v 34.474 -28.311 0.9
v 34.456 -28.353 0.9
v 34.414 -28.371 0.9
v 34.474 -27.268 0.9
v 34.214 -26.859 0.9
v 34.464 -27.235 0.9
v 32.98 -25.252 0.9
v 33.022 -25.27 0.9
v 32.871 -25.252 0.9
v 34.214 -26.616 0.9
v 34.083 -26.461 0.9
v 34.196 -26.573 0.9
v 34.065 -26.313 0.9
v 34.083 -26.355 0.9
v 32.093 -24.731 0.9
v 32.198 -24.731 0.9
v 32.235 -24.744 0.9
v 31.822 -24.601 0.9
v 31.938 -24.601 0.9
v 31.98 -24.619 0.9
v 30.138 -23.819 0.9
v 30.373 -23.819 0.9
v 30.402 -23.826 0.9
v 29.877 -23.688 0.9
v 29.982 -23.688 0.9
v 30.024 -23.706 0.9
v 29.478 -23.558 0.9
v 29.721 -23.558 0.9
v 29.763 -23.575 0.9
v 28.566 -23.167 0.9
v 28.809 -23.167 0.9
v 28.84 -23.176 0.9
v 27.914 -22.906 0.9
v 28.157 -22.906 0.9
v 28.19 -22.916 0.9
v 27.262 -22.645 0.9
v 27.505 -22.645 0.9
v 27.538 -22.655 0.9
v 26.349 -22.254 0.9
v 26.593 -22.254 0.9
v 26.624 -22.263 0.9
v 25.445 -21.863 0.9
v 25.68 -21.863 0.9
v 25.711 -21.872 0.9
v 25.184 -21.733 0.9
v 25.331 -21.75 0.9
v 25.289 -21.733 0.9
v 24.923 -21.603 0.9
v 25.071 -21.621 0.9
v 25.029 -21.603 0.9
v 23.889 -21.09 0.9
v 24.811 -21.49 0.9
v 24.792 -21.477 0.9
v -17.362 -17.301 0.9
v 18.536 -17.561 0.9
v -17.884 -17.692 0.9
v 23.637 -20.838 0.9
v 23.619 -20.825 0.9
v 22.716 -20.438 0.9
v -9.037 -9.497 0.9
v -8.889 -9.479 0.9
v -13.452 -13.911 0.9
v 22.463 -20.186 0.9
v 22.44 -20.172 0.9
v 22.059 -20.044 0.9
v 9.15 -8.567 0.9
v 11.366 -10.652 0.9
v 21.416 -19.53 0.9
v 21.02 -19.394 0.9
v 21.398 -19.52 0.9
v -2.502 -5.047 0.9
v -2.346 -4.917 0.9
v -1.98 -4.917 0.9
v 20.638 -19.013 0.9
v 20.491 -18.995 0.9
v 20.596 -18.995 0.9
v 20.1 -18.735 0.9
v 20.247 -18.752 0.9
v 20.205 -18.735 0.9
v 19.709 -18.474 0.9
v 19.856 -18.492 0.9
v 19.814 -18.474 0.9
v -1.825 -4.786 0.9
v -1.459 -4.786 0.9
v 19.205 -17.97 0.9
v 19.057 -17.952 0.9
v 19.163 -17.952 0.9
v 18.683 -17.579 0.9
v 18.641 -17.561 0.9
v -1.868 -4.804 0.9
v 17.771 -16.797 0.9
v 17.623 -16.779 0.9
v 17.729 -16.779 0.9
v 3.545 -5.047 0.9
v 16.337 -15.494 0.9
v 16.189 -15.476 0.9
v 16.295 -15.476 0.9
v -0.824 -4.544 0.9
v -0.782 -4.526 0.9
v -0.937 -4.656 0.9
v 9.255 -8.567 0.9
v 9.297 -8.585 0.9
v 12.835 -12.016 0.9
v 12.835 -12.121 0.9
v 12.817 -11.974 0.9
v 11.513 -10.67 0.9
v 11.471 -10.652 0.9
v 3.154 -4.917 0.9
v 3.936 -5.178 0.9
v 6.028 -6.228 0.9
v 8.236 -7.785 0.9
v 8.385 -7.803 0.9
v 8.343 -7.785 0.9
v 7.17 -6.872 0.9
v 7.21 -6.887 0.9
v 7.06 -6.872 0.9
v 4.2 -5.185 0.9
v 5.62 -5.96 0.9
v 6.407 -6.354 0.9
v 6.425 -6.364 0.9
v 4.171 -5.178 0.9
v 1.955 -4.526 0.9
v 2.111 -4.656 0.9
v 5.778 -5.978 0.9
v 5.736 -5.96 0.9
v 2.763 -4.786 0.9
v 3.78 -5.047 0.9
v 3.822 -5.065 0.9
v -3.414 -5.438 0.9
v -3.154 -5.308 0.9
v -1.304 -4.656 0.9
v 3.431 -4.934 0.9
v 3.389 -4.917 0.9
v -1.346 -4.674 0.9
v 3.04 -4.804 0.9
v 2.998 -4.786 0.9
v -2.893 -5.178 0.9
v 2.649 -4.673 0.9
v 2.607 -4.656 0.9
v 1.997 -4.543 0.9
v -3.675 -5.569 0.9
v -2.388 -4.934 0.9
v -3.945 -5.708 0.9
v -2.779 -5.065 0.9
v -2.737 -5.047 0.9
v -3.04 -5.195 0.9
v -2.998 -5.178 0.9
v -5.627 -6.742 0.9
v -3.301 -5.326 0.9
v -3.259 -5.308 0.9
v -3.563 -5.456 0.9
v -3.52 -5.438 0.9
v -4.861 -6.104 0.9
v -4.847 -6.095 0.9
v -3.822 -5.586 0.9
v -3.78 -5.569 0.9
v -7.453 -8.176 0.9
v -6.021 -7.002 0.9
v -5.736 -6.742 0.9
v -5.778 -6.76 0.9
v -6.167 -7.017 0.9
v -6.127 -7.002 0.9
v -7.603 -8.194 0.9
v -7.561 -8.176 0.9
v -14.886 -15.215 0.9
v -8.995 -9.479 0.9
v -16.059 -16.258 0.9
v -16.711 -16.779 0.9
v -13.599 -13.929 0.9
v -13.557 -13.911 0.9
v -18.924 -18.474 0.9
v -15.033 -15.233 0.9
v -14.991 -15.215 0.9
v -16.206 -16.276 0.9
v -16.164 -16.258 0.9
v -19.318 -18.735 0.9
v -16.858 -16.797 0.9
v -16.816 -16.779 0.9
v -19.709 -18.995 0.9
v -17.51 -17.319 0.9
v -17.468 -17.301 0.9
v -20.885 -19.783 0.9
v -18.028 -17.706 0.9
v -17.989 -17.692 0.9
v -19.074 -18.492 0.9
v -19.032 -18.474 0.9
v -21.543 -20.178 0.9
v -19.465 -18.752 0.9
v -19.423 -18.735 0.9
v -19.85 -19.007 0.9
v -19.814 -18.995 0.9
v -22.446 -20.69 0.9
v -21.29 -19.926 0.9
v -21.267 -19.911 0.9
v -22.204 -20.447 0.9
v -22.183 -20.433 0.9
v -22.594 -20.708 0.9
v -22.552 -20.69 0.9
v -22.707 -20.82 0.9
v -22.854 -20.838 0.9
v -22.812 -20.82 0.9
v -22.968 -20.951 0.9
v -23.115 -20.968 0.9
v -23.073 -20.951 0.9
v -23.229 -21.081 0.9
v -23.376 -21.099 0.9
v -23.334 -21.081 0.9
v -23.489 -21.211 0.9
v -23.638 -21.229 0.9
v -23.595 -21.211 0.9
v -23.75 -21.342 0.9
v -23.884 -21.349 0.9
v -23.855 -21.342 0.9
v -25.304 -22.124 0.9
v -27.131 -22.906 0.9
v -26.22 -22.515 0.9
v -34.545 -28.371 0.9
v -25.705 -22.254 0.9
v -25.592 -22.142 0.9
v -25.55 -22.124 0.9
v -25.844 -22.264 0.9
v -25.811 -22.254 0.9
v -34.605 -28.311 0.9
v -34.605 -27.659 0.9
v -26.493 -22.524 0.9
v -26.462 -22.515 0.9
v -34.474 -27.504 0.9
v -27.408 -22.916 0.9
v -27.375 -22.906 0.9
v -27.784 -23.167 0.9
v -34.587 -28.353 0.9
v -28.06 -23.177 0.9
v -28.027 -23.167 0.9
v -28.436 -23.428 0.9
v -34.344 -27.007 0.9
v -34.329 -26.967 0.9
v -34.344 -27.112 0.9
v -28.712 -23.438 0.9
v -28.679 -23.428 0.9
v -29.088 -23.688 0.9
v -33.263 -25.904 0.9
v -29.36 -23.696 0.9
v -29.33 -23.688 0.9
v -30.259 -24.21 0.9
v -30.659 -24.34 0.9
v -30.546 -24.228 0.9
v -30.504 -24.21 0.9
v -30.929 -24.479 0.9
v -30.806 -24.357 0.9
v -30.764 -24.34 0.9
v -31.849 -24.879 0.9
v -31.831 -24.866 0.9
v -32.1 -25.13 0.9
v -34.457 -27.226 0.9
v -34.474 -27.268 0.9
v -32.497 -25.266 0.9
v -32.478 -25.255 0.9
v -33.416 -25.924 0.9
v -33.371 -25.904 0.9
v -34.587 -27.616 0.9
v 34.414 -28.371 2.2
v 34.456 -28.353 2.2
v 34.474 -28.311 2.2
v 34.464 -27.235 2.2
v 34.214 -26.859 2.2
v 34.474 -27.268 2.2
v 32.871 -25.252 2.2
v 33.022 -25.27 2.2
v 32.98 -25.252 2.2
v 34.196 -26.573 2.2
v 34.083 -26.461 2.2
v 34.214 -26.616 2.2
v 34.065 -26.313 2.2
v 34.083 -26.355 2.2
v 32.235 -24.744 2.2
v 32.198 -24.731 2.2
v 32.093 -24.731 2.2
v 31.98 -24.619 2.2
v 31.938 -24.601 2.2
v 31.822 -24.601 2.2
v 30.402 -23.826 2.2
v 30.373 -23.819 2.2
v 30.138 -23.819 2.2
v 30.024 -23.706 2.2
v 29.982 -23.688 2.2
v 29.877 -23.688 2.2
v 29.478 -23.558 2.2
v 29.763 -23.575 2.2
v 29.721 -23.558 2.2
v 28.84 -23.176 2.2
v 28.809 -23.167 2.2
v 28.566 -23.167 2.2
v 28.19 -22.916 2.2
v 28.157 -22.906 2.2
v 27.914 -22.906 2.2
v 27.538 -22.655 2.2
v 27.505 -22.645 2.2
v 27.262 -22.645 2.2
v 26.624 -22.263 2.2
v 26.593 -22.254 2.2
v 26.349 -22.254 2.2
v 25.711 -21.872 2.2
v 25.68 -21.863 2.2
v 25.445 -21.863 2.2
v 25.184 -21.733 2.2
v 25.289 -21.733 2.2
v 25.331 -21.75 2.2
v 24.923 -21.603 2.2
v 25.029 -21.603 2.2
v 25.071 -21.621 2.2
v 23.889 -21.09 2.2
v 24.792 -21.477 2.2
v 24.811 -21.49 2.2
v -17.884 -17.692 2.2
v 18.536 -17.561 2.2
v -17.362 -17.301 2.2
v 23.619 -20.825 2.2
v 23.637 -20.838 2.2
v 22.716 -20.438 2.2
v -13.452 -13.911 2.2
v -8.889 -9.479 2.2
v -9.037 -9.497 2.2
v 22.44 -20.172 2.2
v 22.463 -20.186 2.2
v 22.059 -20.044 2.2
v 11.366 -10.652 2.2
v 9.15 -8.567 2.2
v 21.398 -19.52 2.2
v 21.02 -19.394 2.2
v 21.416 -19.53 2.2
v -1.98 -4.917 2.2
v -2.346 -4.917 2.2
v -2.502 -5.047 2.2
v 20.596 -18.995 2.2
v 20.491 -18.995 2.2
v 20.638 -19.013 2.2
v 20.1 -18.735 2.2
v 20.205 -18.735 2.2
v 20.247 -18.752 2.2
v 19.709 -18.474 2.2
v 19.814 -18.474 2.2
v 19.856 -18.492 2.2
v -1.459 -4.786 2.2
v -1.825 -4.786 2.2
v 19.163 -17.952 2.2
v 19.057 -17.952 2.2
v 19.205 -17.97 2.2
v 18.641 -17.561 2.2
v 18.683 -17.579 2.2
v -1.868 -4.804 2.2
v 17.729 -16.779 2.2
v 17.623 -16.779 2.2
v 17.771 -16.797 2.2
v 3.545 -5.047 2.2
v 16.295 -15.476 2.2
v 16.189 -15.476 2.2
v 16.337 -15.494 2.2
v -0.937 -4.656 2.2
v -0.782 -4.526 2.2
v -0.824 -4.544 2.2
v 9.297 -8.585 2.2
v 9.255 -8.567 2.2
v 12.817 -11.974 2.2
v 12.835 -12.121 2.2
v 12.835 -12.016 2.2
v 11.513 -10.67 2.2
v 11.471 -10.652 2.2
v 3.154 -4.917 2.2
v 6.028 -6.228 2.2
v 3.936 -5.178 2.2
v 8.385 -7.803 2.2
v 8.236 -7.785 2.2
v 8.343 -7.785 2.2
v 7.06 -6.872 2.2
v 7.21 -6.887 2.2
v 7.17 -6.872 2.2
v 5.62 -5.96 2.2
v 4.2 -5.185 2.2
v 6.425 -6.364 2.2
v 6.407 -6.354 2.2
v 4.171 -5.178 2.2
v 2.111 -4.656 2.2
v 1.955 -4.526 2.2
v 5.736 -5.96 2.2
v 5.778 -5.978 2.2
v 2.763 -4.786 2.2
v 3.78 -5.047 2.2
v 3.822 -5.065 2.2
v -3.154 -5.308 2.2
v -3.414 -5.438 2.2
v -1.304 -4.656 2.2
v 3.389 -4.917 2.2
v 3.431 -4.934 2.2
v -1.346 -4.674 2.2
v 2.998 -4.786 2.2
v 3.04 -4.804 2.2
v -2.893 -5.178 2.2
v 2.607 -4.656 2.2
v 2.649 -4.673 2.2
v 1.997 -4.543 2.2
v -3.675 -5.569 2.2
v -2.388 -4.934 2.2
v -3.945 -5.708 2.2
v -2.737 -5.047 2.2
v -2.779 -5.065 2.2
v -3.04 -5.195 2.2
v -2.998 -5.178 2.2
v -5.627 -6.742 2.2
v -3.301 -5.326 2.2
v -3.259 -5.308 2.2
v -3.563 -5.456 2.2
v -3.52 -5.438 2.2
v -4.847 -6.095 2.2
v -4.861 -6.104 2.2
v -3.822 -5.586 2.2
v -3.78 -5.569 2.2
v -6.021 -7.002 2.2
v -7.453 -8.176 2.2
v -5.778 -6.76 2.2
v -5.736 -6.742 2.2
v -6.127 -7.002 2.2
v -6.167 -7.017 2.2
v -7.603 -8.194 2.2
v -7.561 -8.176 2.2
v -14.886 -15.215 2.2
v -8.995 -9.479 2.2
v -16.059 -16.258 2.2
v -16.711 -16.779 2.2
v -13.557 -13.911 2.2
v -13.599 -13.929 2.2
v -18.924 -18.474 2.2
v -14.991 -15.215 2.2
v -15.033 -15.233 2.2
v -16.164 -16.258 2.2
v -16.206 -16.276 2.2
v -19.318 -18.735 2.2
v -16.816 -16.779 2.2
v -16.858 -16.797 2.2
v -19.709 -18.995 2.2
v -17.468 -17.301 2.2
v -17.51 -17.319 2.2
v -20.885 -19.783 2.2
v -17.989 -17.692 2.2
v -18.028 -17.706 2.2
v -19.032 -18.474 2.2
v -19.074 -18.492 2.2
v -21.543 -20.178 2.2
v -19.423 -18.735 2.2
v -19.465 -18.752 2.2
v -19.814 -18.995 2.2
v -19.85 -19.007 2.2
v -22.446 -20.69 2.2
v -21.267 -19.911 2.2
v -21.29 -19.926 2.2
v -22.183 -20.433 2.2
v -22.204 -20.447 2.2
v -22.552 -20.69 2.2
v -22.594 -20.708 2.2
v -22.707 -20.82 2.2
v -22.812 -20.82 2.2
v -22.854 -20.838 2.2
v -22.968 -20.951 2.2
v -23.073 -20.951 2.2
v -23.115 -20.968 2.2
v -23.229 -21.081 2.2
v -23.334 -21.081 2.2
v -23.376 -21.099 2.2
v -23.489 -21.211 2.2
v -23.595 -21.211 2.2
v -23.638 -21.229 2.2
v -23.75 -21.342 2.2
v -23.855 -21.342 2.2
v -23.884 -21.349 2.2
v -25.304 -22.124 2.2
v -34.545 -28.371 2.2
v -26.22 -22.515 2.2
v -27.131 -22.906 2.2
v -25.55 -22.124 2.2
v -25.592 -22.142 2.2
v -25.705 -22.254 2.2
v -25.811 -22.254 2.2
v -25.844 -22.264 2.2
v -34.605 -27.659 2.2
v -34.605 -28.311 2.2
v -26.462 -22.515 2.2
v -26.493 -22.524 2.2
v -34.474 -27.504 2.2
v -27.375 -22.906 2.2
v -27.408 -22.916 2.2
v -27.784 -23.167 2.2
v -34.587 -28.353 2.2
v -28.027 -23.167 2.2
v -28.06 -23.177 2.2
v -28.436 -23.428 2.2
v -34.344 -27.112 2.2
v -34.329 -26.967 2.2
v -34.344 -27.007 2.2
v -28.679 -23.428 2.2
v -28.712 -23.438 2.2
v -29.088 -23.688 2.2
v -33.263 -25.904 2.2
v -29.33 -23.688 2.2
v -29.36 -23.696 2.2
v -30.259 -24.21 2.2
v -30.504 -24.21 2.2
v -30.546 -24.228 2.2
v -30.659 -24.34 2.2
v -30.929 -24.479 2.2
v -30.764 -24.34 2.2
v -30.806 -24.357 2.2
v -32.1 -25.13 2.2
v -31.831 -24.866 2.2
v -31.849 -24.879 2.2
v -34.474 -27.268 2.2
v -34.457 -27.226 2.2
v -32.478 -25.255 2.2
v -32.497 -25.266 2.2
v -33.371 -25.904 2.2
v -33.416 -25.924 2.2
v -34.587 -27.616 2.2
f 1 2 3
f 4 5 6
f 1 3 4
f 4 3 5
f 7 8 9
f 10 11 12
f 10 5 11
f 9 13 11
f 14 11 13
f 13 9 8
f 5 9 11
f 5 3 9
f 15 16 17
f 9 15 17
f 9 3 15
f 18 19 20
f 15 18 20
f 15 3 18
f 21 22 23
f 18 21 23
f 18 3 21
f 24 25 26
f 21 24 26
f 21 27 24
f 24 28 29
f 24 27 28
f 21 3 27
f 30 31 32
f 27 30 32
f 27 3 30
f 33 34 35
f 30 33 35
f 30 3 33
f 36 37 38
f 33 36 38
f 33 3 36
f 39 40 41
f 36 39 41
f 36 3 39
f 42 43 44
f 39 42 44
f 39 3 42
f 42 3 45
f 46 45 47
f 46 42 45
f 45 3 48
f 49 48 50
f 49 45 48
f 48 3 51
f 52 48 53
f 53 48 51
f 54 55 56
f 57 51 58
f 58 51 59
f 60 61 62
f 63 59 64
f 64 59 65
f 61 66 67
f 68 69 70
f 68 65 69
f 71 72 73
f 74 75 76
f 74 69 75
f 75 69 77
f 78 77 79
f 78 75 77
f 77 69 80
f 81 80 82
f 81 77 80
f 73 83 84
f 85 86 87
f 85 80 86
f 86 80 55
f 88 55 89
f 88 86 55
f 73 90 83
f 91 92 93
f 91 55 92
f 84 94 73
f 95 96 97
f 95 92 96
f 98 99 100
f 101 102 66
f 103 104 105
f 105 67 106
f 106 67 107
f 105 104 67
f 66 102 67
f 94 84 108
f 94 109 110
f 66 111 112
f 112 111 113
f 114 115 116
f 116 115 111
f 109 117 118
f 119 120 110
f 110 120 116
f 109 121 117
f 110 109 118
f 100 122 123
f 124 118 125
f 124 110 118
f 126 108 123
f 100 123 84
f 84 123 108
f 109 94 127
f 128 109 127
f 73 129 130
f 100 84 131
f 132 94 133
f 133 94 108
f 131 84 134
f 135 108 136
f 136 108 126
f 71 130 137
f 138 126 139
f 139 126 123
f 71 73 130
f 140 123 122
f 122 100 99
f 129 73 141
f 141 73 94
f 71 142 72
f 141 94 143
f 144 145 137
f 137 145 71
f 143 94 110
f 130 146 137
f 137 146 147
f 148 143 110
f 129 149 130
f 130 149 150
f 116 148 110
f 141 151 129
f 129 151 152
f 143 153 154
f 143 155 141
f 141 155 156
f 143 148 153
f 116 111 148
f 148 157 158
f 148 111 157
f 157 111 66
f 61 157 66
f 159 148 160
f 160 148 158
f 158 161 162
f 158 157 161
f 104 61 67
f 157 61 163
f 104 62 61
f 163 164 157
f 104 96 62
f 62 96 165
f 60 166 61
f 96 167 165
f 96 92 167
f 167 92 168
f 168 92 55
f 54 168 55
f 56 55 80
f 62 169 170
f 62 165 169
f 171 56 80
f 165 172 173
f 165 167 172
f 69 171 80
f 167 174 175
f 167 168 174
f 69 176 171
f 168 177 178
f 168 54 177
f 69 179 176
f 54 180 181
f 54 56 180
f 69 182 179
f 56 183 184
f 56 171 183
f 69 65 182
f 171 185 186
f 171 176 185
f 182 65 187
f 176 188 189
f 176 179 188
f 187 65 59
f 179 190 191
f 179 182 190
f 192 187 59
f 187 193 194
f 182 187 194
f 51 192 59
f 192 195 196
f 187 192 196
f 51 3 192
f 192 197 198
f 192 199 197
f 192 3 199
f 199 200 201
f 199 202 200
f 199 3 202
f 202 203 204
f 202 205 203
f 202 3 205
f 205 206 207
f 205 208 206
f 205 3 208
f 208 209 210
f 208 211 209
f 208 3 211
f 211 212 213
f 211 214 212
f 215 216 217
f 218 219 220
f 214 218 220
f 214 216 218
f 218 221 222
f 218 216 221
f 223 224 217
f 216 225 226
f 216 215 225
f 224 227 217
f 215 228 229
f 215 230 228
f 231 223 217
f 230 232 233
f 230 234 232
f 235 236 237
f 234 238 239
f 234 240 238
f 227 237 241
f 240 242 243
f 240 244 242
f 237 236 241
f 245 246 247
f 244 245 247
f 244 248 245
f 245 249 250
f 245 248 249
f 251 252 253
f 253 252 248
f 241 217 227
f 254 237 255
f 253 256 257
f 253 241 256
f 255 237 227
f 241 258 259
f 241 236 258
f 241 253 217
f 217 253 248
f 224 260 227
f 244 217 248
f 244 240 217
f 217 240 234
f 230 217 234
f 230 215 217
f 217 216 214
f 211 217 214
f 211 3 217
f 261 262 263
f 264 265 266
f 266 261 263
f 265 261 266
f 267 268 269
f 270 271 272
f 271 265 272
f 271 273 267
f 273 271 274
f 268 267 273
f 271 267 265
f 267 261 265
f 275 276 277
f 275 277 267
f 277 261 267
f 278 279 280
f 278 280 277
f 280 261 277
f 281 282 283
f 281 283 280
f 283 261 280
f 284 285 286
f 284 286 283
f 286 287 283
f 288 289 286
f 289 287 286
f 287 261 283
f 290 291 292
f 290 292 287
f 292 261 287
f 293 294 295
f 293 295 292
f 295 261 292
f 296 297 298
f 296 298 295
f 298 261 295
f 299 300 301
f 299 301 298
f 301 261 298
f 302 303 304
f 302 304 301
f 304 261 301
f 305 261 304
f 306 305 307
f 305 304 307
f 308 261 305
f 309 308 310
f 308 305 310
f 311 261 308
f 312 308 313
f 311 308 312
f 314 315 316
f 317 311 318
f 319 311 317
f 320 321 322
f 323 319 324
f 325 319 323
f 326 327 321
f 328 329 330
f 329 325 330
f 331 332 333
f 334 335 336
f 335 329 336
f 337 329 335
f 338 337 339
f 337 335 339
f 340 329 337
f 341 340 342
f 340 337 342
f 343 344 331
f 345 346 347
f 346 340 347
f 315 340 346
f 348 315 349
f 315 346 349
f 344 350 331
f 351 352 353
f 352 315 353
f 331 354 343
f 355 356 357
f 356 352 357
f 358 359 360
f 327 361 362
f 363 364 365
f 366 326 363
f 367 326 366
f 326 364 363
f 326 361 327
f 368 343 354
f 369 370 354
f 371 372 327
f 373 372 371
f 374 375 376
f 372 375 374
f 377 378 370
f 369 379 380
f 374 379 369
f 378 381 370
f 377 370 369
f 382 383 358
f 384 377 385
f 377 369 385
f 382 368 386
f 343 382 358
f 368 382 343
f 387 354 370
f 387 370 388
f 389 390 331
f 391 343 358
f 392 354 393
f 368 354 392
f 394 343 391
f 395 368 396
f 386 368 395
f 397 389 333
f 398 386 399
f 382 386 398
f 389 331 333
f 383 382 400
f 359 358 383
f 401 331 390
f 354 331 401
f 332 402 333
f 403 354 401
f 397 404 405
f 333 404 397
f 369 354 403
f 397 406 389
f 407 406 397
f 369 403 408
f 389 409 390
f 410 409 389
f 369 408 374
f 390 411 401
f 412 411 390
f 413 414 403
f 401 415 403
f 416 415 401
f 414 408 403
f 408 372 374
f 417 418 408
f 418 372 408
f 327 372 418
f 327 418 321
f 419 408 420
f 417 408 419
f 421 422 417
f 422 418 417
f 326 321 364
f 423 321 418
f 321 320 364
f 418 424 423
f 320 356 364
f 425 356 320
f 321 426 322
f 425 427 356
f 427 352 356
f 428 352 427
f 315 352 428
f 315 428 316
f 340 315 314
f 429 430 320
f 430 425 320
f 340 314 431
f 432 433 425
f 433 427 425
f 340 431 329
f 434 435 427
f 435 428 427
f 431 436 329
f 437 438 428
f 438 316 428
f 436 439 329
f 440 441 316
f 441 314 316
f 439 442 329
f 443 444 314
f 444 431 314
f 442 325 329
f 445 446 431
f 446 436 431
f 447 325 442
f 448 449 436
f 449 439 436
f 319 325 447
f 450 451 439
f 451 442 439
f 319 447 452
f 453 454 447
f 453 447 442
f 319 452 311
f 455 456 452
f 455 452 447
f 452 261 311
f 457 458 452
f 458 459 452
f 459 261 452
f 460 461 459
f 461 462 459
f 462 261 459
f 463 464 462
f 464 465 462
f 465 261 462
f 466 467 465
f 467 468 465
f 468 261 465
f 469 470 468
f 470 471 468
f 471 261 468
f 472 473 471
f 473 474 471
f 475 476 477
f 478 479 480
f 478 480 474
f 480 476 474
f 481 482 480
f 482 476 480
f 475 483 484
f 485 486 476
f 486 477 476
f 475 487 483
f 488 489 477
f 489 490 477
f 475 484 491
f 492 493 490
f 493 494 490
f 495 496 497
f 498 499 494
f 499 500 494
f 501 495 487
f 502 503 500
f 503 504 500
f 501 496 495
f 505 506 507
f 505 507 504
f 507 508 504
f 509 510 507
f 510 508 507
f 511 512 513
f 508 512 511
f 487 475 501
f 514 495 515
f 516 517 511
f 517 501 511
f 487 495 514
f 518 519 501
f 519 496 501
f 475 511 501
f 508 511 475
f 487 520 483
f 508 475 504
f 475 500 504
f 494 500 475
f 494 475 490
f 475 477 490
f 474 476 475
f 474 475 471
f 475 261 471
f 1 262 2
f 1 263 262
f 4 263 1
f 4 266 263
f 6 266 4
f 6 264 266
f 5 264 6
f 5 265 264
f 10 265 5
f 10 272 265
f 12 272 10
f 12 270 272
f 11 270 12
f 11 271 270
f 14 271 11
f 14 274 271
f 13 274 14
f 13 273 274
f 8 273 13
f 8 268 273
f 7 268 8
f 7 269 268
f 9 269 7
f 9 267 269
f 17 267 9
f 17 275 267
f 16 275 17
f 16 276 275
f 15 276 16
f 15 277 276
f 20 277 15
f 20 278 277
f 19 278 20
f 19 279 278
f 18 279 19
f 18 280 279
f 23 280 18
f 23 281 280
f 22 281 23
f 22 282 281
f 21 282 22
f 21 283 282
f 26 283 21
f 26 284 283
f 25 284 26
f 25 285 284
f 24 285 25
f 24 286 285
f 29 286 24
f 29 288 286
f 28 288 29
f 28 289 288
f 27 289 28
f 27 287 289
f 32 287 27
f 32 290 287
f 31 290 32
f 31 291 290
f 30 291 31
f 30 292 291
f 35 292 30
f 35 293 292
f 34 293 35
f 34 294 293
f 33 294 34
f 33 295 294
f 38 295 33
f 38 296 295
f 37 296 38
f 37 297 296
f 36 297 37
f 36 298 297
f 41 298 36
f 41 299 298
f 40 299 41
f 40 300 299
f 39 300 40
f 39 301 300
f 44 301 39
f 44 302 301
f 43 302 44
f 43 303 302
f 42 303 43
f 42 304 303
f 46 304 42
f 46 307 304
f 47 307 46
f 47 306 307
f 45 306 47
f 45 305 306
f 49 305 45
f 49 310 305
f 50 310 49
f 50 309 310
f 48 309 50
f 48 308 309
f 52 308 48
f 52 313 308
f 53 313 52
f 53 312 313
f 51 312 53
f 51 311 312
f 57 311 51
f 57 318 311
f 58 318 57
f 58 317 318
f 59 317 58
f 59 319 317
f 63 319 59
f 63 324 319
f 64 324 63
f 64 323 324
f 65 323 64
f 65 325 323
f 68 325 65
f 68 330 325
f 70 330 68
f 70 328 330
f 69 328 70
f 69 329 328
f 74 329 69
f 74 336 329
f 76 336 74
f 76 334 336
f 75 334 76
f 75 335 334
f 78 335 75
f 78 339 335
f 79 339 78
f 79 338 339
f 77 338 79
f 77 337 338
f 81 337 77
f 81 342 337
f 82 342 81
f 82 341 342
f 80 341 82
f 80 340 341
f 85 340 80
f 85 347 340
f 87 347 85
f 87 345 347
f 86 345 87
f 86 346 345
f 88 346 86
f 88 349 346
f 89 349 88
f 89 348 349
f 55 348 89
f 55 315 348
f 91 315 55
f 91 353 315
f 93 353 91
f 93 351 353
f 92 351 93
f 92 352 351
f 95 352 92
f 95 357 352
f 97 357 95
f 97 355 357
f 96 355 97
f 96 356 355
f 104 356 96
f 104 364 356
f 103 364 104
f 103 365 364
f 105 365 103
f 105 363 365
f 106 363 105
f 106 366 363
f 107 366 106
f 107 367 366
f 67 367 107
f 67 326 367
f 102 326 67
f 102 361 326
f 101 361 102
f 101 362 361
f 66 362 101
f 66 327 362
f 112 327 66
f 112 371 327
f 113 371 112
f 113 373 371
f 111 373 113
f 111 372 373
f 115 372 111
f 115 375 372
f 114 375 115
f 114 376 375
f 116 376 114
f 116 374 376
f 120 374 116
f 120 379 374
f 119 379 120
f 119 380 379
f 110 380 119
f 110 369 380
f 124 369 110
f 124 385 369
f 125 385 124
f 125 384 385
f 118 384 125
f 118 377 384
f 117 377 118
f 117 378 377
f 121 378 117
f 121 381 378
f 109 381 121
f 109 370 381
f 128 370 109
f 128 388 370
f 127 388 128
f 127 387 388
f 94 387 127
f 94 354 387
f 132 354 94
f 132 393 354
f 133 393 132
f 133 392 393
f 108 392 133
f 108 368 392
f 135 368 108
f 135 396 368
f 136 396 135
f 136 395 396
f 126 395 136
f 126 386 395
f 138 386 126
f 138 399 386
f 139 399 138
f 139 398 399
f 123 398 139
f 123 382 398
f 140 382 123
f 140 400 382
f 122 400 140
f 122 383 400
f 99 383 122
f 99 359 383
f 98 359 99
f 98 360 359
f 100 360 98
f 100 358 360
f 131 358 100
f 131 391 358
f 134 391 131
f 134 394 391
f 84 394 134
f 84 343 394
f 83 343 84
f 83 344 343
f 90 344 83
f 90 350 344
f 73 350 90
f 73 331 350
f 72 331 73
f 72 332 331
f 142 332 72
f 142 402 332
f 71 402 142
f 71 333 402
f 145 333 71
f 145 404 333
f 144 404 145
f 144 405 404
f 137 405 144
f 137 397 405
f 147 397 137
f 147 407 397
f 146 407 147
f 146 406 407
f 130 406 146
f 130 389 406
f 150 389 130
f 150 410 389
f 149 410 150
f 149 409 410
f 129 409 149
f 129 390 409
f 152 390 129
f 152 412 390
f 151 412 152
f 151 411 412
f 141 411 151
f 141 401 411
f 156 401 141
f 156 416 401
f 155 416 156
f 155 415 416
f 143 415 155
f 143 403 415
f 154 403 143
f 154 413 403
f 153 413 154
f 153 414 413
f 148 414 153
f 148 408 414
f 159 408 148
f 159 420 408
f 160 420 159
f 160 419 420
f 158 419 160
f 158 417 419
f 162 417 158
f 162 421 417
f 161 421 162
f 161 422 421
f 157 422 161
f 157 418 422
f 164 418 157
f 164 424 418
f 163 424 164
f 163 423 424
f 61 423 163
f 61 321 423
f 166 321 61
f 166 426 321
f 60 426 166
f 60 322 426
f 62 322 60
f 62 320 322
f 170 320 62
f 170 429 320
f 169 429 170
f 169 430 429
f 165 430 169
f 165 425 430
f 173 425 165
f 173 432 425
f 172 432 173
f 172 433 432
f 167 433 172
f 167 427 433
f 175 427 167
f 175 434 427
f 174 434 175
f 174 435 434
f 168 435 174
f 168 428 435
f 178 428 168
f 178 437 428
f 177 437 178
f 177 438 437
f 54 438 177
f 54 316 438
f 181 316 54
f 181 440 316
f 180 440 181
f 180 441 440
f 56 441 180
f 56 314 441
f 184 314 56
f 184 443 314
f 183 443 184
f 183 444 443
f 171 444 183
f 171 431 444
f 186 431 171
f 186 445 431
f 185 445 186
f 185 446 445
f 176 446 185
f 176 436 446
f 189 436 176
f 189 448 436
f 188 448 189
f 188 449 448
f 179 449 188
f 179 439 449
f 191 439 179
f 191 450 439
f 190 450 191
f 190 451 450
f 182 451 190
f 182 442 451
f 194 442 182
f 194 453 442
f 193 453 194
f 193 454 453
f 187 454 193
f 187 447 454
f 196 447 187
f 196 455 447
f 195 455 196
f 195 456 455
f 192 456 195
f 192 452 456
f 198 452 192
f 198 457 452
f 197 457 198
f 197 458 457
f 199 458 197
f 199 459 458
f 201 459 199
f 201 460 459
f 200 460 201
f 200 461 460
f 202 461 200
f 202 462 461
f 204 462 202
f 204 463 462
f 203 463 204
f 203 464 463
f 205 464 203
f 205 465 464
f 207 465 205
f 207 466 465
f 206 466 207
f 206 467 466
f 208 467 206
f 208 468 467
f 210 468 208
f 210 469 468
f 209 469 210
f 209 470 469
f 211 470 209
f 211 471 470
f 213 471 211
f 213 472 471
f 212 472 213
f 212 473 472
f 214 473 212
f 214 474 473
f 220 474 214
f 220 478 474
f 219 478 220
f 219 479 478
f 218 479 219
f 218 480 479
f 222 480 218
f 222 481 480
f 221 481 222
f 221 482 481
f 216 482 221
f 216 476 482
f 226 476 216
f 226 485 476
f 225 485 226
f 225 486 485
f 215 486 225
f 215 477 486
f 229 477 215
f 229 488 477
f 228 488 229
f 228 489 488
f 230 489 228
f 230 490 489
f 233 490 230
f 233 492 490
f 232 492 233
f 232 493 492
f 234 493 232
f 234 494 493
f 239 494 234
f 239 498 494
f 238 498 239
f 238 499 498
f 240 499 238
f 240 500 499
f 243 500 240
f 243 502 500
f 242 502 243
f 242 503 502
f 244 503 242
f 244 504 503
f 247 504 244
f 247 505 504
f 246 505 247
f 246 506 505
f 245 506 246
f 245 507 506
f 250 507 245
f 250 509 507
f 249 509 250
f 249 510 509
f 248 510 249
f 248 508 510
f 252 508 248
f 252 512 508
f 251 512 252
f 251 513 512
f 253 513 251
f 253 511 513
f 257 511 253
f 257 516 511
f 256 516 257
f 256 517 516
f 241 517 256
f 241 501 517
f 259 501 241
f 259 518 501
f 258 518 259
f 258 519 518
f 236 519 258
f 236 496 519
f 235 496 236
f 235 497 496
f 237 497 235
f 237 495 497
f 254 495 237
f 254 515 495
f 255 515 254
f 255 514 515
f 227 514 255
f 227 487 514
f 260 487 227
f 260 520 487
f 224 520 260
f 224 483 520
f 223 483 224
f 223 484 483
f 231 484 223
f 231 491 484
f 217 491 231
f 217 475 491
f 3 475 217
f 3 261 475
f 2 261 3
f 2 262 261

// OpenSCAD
$fn = 24;
translate([0, -2.500, 0.900])
  linear_extrude(height=1.300) {
offset(r=0.06, $fn=8) {
    polygon(points=[[-34.545,-25.159],[-34.545,-25.811],[34.414,-25.811],[34.414,-24.768],[34.154,-24.377],[34.154,-24.116],[34.023,-23.986],[34.023,-23.855],[32.980,-22.812],[32.850,-22.812],[32.198,-22.291],[32.068,-22.291],[31.938,-22.161],[31.807,-22.161],[30.373,-21.379],[30.113,-21.379],[29.982,-21.248],[29.852,-21.248],[29.721,-21.118],[29.461,-21.118],[28.809,-20.727],[28.548,-20.727],[28.157,-20.466],[27.896,-20.466],[27.505,-20.205],[27.245,-20.205],[26.593,-19.814],[26.332,-19.814],[25.680,-19.423],[25.420,-19.423],[25.289,-19.293],[25.159,-19.293],[25.029,-19.163],[24.898,-19.163],[24.768,-19.032],[23.855,-18.641],[23.595,-18.380],[22.682,-17.989],[22.421,-17.729],[22.030,-17.598],[21.379,-17.077],[20.988,-16.946],[20.596,-16.555],[20.466,-16.555],[20.205,-16.295],[20.075,-16.295],[19.814,-16.034],[19.684,-16.034],[19.163,-15.512],[19.032,-15.512],[18.641,-15.121],[18.511,-15.121],[17.729,-14.339],[17.598,-14.339],[16.295,-13.036],[16.164,-13.036],[12.775,-9.646],[12.775,-9.516],[11.471,-8.212],[11.341,-8.212],[9.255,-6.127],[9.125,-6.127],[8.343,-5.345],[8.213,-5.345],[7.170,-4.432],[7.039,-4.432],[6.388,-3.911],[5.996,-3.780],[5.736,-3.520],[5.605,-3.520],[4.171,-2.738],[3.911,-2.738],[3.780,-2.607],[3.520,-2.607],[3.389,-2.477],[3.129,-2.477],[2.998,-2.346],[2.738,-2.346],[2.607,-2.216],[2.086,-2.216],[1.955,-2.086],[-0.782,-2.086],[-0.912,-2.216],[-1.304,-2.216],[-1.434,-2.346],[-1.825,-2.346],[-1.955,-2.477],[-2.346,-2.477],[-2.477,-2.607],[-2.737,-2.607],[-2.868,-2.738],[-2.998,-2.738],[-3.129,-2.868],[-3.259,-2.868],[-3.389,-2.998],[-3.520,-2.998],[-3.650,-3.129],[-3.780,-3.129],[-3.911,-3.259],[-4.823,-3.650],[-5.605,-4.302],[-5.736,-4.302],[-5.996,-4.562],[-6.127,-4.562],[-7.430,-5.736],[-7.561,-5.736],[-8.864,-7.039],[-8.995,-7.039],[-13.427,-11.471],[-13.557,-11.471],[-14.861,-12.775],[-14.991,-12.775],[-16.034,-13.818],[-16.164,-13.818],[-16.686,-14.339],[-16.816,-14.339],[-17.337,-14.861],[-17.468,-14.861],[-17.859,-15.252],[-17.989,-15.252],[-18.902,-16.034],[-19.032,-16.034],[-19.293,-16.295],[-19.423,-16.295],[-19.684,-16.555],[-19.814,-16.555],[-20.857,-17.337],[-21.248,-17.468],[-21.509,-17.729],[-22.161,-17.989],[-22.421,-18.250],[-22.552,-18.250],[-22.682,-18.380],[-22.812,-18.380],[-22.943,-18.511],[-23.073,-18.511],[-23.204,-18.641],[-23.334,-18.641],[-23.464,-18.771],[-23.595,-18.771],[-23.725,-18.902],[-23.855,-18.902],[-25.289,-19.684],[-25.550,-19.684],[-25.680,-19.814],[-25.811,-19.814],[-26.202,-20.075],[-26.462,-20.075],[-27.114,-20.466],[-27.375,-20.466],[-27.766,-20.727],[-28.027,-20.727],[-28.418,-20.988],[-28.679,-20.988],[-29.070,-21.248],[-29.330,-21.248],[-30.243,-21.770],[-30.504,-21.770],[-30.634,-21.900],[-30.764,-21.900],[-30.895,-22.030],[-31.807,-22.421],[-32.068,-22.682],[-32.459,-22.812],[-33.241,-23.464],[-33.371,-23.464],[-34.284,-24.507],[-34.284,-24.637],[-34.414,-24.768],[-34.414,-25.029]], paths=[[0,1,2,3,4,5,6,7,8,9,10,11,12,13,14,15,16,17,18,19,20,21,22,23,24,25,26,27,28,29,30,31,32,33,34,35,36,37,38,39,40,41,42,43,44,45,46,47,48,49,50,51,52,53,54,55,56,57,58,59,60,61,62,63,64,65,66,67,68,69,70,71,72,73,74,75,76,77,78,79,80,81,82,83,84,85,86,87,88,89,90,91,92,93,94,95,96,97,98,99,100,101,102,103,104,105,106,107,108,109,110,111,112,113,114,115,116,117,118,119,120,121,122,123,124,125,126,127,128,129,130,131,132,133,134,135,136,137,138,139,140,141,142,143,144,145,146,147,148,149,150,151,152,153,154,155,156,157,158,159,160,161,162,163,164,165,166,167,168,169]]);
}
}
